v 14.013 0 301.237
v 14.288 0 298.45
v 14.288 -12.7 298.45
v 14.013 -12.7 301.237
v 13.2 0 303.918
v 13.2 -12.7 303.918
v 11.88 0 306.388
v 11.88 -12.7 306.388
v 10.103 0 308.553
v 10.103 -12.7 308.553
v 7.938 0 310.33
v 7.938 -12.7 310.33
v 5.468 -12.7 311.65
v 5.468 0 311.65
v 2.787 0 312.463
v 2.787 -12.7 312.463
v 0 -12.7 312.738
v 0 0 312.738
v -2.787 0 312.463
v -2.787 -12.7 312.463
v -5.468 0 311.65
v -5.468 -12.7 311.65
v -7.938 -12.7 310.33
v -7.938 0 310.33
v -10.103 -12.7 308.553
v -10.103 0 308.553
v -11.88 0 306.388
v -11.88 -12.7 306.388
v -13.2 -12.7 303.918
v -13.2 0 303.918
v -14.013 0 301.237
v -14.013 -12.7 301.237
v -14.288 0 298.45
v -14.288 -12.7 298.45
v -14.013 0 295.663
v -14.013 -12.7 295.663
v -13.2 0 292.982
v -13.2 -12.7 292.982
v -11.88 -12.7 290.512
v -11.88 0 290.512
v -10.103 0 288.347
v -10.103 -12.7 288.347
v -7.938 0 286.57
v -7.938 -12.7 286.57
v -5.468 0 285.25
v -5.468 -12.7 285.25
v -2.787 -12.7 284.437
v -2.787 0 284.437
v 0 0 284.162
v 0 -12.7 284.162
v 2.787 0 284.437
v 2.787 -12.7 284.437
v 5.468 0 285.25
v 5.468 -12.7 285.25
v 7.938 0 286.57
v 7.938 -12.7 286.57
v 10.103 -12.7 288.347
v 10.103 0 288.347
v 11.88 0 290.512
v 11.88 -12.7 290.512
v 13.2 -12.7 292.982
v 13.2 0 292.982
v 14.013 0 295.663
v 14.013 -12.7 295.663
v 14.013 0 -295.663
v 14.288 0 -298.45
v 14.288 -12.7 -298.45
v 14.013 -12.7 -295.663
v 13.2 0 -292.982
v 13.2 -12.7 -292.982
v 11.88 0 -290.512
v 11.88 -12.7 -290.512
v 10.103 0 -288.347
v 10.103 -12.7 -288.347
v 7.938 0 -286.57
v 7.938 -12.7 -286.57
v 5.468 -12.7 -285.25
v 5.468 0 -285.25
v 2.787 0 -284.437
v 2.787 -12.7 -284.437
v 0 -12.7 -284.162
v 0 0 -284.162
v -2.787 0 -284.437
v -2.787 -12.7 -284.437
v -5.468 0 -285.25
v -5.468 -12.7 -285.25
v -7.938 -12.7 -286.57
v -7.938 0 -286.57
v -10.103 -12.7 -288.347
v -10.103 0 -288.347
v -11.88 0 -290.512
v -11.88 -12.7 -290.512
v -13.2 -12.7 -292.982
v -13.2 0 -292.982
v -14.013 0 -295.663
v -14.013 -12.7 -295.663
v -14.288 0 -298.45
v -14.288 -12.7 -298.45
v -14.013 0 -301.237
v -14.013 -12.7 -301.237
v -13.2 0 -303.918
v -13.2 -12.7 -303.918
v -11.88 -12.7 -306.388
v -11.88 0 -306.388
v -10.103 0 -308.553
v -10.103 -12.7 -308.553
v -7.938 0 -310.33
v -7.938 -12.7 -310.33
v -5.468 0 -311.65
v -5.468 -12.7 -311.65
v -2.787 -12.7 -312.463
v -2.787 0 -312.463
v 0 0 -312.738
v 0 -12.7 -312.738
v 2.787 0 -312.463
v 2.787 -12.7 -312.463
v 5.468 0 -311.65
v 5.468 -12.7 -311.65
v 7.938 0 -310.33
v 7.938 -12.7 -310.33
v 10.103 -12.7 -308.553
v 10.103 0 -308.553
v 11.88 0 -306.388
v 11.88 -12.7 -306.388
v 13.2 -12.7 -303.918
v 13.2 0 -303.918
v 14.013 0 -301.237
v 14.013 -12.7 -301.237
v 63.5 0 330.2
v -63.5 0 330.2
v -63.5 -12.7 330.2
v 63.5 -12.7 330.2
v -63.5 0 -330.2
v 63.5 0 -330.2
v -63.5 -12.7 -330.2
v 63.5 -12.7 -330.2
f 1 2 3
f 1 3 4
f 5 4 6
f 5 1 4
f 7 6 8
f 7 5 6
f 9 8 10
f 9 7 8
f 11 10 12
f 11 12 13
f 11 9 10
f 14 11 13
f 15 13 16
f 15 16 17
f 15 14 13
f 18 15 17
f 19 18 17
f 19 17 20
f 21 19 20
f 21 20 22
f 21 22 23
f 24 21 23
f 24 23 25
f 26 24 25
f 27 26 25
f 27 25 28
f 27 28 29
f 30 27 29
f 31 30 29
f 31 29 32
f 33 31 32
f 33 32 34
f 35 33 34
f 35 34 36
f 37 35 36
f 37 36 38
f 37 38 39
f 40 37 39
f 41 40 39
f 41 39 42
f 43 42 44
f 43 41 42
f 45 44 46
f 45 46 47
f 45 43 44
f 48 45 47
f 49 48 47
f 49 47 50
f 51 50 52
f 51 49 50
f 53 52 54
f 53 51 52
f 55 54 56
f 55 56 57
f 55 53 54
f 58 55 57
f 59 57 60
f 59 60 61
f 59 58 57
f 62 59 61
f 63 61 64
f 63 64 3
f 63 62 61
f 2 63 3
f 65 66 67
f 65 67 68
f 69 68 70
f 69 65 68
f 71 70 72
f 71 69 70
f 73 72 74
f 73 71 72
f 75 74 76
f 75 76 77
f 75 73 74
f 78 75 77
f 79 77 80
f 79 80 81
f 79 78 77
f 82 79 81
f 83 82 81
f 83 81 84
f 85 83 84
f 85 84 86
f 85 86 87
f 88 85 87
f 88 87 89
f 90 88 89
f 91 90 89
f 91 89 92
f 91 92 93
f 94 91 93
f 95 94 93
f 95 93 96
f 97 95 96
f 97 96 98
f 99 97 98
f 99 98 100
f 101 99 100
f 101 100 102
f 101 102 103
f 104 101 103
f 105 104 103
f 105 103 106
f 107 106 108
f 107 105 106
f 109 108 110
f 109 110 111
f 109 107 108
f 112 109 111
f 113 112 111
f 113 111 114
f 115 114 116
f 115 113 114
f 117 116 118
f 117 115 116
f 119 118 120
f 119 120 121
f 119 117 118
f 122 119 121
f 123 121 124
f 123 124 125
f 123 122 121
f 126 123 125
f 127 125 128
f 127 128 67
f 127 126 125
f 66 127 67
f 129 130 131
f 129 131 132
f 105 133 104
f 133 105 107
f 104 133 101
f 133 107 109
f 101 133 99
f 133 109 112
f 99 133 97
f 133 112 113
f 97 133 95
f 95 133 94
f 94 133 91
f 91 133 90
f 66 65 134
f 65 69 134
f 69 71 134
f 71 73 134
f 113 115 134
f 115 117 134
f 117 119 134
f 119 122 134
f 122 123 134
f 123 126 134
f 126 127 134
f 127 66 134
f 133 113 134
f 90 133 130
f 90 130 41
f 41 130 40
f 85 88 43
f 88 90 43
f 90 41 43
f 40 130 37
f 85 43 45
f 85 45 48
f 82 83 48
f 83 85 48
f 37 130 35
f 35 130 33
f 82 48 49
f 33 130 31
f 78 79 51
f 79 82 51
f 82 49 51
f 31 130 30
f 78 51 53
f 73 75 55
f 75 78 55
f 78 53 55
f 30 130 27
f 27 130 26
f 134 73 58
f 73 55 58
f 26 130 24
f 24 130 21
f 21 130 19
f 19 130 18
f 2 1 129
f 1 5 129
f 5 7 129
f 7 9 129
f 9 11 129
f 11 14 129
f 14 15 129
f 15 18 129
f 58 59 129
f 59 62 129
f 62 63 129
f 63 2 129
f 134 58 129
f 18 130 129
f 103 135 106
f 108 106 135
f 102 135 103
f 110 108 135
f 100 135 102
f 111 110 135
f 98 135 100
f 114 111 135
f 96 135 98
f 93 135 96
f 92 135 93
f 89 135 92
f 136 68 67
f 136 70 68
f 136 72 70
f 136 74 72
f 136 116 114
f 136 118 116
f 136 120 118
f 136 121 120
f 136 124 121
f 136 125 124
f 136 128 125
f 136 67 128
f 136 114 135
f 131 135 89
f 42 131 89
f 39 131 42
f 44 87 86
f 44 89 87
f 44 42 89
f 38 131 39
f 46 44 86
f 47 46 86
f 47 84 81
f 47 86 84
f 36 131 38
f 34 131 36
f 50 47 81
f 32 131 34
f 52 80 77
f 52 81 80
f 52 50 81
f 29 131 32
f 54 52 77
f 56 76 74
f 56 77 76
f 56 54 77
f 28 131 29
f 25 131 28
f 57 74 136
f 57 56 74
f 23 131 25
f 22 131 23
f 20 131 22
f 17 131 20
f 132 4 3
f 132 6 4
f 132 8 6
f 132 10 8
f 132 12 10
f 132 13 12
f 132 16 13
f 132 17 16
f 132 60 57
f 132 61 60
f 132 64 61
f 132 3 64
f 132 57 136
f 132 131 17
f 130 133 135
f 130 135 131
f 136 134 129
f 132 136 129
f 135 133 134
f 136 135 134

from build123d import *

# Parameters (mm, degrees)
F0_W     = 127
F0_H     = 660.4
F0_R     = 14.2875
F1_DEPTH = 9.525
F2_DEPTH = 12.7


with BuildPart() as f1:
    # F0 (on Front) → F1 (new body)
    with BuildSketch(Plane.XZ):
        Rectangle(F0_W, F0_H)
        with Locations((0, -298.45)):
            Circle(F0_R, mode=Mode.SUBTRACT)
        with Locations((0, 298.45)):
            Circle(F0_R, mode=Mode.SUBTRACT)
    extrude(amount=F1_DEPTH)

    # F0 (on Front) → F2 (join)
    with BuildSketch(Plane.XZ):
        Rectangle(F0_W, F0_H)
        with Locations((0, -298.45)):
            Circle(F0_R, mode=Mode.SUBTRACT)
        with Locations((0, 298.45)):
            Circle(F0_R, mode=Mode.SUBTRACT)
    extrude(amount=F2_DEPTH)


solid = f1.part
